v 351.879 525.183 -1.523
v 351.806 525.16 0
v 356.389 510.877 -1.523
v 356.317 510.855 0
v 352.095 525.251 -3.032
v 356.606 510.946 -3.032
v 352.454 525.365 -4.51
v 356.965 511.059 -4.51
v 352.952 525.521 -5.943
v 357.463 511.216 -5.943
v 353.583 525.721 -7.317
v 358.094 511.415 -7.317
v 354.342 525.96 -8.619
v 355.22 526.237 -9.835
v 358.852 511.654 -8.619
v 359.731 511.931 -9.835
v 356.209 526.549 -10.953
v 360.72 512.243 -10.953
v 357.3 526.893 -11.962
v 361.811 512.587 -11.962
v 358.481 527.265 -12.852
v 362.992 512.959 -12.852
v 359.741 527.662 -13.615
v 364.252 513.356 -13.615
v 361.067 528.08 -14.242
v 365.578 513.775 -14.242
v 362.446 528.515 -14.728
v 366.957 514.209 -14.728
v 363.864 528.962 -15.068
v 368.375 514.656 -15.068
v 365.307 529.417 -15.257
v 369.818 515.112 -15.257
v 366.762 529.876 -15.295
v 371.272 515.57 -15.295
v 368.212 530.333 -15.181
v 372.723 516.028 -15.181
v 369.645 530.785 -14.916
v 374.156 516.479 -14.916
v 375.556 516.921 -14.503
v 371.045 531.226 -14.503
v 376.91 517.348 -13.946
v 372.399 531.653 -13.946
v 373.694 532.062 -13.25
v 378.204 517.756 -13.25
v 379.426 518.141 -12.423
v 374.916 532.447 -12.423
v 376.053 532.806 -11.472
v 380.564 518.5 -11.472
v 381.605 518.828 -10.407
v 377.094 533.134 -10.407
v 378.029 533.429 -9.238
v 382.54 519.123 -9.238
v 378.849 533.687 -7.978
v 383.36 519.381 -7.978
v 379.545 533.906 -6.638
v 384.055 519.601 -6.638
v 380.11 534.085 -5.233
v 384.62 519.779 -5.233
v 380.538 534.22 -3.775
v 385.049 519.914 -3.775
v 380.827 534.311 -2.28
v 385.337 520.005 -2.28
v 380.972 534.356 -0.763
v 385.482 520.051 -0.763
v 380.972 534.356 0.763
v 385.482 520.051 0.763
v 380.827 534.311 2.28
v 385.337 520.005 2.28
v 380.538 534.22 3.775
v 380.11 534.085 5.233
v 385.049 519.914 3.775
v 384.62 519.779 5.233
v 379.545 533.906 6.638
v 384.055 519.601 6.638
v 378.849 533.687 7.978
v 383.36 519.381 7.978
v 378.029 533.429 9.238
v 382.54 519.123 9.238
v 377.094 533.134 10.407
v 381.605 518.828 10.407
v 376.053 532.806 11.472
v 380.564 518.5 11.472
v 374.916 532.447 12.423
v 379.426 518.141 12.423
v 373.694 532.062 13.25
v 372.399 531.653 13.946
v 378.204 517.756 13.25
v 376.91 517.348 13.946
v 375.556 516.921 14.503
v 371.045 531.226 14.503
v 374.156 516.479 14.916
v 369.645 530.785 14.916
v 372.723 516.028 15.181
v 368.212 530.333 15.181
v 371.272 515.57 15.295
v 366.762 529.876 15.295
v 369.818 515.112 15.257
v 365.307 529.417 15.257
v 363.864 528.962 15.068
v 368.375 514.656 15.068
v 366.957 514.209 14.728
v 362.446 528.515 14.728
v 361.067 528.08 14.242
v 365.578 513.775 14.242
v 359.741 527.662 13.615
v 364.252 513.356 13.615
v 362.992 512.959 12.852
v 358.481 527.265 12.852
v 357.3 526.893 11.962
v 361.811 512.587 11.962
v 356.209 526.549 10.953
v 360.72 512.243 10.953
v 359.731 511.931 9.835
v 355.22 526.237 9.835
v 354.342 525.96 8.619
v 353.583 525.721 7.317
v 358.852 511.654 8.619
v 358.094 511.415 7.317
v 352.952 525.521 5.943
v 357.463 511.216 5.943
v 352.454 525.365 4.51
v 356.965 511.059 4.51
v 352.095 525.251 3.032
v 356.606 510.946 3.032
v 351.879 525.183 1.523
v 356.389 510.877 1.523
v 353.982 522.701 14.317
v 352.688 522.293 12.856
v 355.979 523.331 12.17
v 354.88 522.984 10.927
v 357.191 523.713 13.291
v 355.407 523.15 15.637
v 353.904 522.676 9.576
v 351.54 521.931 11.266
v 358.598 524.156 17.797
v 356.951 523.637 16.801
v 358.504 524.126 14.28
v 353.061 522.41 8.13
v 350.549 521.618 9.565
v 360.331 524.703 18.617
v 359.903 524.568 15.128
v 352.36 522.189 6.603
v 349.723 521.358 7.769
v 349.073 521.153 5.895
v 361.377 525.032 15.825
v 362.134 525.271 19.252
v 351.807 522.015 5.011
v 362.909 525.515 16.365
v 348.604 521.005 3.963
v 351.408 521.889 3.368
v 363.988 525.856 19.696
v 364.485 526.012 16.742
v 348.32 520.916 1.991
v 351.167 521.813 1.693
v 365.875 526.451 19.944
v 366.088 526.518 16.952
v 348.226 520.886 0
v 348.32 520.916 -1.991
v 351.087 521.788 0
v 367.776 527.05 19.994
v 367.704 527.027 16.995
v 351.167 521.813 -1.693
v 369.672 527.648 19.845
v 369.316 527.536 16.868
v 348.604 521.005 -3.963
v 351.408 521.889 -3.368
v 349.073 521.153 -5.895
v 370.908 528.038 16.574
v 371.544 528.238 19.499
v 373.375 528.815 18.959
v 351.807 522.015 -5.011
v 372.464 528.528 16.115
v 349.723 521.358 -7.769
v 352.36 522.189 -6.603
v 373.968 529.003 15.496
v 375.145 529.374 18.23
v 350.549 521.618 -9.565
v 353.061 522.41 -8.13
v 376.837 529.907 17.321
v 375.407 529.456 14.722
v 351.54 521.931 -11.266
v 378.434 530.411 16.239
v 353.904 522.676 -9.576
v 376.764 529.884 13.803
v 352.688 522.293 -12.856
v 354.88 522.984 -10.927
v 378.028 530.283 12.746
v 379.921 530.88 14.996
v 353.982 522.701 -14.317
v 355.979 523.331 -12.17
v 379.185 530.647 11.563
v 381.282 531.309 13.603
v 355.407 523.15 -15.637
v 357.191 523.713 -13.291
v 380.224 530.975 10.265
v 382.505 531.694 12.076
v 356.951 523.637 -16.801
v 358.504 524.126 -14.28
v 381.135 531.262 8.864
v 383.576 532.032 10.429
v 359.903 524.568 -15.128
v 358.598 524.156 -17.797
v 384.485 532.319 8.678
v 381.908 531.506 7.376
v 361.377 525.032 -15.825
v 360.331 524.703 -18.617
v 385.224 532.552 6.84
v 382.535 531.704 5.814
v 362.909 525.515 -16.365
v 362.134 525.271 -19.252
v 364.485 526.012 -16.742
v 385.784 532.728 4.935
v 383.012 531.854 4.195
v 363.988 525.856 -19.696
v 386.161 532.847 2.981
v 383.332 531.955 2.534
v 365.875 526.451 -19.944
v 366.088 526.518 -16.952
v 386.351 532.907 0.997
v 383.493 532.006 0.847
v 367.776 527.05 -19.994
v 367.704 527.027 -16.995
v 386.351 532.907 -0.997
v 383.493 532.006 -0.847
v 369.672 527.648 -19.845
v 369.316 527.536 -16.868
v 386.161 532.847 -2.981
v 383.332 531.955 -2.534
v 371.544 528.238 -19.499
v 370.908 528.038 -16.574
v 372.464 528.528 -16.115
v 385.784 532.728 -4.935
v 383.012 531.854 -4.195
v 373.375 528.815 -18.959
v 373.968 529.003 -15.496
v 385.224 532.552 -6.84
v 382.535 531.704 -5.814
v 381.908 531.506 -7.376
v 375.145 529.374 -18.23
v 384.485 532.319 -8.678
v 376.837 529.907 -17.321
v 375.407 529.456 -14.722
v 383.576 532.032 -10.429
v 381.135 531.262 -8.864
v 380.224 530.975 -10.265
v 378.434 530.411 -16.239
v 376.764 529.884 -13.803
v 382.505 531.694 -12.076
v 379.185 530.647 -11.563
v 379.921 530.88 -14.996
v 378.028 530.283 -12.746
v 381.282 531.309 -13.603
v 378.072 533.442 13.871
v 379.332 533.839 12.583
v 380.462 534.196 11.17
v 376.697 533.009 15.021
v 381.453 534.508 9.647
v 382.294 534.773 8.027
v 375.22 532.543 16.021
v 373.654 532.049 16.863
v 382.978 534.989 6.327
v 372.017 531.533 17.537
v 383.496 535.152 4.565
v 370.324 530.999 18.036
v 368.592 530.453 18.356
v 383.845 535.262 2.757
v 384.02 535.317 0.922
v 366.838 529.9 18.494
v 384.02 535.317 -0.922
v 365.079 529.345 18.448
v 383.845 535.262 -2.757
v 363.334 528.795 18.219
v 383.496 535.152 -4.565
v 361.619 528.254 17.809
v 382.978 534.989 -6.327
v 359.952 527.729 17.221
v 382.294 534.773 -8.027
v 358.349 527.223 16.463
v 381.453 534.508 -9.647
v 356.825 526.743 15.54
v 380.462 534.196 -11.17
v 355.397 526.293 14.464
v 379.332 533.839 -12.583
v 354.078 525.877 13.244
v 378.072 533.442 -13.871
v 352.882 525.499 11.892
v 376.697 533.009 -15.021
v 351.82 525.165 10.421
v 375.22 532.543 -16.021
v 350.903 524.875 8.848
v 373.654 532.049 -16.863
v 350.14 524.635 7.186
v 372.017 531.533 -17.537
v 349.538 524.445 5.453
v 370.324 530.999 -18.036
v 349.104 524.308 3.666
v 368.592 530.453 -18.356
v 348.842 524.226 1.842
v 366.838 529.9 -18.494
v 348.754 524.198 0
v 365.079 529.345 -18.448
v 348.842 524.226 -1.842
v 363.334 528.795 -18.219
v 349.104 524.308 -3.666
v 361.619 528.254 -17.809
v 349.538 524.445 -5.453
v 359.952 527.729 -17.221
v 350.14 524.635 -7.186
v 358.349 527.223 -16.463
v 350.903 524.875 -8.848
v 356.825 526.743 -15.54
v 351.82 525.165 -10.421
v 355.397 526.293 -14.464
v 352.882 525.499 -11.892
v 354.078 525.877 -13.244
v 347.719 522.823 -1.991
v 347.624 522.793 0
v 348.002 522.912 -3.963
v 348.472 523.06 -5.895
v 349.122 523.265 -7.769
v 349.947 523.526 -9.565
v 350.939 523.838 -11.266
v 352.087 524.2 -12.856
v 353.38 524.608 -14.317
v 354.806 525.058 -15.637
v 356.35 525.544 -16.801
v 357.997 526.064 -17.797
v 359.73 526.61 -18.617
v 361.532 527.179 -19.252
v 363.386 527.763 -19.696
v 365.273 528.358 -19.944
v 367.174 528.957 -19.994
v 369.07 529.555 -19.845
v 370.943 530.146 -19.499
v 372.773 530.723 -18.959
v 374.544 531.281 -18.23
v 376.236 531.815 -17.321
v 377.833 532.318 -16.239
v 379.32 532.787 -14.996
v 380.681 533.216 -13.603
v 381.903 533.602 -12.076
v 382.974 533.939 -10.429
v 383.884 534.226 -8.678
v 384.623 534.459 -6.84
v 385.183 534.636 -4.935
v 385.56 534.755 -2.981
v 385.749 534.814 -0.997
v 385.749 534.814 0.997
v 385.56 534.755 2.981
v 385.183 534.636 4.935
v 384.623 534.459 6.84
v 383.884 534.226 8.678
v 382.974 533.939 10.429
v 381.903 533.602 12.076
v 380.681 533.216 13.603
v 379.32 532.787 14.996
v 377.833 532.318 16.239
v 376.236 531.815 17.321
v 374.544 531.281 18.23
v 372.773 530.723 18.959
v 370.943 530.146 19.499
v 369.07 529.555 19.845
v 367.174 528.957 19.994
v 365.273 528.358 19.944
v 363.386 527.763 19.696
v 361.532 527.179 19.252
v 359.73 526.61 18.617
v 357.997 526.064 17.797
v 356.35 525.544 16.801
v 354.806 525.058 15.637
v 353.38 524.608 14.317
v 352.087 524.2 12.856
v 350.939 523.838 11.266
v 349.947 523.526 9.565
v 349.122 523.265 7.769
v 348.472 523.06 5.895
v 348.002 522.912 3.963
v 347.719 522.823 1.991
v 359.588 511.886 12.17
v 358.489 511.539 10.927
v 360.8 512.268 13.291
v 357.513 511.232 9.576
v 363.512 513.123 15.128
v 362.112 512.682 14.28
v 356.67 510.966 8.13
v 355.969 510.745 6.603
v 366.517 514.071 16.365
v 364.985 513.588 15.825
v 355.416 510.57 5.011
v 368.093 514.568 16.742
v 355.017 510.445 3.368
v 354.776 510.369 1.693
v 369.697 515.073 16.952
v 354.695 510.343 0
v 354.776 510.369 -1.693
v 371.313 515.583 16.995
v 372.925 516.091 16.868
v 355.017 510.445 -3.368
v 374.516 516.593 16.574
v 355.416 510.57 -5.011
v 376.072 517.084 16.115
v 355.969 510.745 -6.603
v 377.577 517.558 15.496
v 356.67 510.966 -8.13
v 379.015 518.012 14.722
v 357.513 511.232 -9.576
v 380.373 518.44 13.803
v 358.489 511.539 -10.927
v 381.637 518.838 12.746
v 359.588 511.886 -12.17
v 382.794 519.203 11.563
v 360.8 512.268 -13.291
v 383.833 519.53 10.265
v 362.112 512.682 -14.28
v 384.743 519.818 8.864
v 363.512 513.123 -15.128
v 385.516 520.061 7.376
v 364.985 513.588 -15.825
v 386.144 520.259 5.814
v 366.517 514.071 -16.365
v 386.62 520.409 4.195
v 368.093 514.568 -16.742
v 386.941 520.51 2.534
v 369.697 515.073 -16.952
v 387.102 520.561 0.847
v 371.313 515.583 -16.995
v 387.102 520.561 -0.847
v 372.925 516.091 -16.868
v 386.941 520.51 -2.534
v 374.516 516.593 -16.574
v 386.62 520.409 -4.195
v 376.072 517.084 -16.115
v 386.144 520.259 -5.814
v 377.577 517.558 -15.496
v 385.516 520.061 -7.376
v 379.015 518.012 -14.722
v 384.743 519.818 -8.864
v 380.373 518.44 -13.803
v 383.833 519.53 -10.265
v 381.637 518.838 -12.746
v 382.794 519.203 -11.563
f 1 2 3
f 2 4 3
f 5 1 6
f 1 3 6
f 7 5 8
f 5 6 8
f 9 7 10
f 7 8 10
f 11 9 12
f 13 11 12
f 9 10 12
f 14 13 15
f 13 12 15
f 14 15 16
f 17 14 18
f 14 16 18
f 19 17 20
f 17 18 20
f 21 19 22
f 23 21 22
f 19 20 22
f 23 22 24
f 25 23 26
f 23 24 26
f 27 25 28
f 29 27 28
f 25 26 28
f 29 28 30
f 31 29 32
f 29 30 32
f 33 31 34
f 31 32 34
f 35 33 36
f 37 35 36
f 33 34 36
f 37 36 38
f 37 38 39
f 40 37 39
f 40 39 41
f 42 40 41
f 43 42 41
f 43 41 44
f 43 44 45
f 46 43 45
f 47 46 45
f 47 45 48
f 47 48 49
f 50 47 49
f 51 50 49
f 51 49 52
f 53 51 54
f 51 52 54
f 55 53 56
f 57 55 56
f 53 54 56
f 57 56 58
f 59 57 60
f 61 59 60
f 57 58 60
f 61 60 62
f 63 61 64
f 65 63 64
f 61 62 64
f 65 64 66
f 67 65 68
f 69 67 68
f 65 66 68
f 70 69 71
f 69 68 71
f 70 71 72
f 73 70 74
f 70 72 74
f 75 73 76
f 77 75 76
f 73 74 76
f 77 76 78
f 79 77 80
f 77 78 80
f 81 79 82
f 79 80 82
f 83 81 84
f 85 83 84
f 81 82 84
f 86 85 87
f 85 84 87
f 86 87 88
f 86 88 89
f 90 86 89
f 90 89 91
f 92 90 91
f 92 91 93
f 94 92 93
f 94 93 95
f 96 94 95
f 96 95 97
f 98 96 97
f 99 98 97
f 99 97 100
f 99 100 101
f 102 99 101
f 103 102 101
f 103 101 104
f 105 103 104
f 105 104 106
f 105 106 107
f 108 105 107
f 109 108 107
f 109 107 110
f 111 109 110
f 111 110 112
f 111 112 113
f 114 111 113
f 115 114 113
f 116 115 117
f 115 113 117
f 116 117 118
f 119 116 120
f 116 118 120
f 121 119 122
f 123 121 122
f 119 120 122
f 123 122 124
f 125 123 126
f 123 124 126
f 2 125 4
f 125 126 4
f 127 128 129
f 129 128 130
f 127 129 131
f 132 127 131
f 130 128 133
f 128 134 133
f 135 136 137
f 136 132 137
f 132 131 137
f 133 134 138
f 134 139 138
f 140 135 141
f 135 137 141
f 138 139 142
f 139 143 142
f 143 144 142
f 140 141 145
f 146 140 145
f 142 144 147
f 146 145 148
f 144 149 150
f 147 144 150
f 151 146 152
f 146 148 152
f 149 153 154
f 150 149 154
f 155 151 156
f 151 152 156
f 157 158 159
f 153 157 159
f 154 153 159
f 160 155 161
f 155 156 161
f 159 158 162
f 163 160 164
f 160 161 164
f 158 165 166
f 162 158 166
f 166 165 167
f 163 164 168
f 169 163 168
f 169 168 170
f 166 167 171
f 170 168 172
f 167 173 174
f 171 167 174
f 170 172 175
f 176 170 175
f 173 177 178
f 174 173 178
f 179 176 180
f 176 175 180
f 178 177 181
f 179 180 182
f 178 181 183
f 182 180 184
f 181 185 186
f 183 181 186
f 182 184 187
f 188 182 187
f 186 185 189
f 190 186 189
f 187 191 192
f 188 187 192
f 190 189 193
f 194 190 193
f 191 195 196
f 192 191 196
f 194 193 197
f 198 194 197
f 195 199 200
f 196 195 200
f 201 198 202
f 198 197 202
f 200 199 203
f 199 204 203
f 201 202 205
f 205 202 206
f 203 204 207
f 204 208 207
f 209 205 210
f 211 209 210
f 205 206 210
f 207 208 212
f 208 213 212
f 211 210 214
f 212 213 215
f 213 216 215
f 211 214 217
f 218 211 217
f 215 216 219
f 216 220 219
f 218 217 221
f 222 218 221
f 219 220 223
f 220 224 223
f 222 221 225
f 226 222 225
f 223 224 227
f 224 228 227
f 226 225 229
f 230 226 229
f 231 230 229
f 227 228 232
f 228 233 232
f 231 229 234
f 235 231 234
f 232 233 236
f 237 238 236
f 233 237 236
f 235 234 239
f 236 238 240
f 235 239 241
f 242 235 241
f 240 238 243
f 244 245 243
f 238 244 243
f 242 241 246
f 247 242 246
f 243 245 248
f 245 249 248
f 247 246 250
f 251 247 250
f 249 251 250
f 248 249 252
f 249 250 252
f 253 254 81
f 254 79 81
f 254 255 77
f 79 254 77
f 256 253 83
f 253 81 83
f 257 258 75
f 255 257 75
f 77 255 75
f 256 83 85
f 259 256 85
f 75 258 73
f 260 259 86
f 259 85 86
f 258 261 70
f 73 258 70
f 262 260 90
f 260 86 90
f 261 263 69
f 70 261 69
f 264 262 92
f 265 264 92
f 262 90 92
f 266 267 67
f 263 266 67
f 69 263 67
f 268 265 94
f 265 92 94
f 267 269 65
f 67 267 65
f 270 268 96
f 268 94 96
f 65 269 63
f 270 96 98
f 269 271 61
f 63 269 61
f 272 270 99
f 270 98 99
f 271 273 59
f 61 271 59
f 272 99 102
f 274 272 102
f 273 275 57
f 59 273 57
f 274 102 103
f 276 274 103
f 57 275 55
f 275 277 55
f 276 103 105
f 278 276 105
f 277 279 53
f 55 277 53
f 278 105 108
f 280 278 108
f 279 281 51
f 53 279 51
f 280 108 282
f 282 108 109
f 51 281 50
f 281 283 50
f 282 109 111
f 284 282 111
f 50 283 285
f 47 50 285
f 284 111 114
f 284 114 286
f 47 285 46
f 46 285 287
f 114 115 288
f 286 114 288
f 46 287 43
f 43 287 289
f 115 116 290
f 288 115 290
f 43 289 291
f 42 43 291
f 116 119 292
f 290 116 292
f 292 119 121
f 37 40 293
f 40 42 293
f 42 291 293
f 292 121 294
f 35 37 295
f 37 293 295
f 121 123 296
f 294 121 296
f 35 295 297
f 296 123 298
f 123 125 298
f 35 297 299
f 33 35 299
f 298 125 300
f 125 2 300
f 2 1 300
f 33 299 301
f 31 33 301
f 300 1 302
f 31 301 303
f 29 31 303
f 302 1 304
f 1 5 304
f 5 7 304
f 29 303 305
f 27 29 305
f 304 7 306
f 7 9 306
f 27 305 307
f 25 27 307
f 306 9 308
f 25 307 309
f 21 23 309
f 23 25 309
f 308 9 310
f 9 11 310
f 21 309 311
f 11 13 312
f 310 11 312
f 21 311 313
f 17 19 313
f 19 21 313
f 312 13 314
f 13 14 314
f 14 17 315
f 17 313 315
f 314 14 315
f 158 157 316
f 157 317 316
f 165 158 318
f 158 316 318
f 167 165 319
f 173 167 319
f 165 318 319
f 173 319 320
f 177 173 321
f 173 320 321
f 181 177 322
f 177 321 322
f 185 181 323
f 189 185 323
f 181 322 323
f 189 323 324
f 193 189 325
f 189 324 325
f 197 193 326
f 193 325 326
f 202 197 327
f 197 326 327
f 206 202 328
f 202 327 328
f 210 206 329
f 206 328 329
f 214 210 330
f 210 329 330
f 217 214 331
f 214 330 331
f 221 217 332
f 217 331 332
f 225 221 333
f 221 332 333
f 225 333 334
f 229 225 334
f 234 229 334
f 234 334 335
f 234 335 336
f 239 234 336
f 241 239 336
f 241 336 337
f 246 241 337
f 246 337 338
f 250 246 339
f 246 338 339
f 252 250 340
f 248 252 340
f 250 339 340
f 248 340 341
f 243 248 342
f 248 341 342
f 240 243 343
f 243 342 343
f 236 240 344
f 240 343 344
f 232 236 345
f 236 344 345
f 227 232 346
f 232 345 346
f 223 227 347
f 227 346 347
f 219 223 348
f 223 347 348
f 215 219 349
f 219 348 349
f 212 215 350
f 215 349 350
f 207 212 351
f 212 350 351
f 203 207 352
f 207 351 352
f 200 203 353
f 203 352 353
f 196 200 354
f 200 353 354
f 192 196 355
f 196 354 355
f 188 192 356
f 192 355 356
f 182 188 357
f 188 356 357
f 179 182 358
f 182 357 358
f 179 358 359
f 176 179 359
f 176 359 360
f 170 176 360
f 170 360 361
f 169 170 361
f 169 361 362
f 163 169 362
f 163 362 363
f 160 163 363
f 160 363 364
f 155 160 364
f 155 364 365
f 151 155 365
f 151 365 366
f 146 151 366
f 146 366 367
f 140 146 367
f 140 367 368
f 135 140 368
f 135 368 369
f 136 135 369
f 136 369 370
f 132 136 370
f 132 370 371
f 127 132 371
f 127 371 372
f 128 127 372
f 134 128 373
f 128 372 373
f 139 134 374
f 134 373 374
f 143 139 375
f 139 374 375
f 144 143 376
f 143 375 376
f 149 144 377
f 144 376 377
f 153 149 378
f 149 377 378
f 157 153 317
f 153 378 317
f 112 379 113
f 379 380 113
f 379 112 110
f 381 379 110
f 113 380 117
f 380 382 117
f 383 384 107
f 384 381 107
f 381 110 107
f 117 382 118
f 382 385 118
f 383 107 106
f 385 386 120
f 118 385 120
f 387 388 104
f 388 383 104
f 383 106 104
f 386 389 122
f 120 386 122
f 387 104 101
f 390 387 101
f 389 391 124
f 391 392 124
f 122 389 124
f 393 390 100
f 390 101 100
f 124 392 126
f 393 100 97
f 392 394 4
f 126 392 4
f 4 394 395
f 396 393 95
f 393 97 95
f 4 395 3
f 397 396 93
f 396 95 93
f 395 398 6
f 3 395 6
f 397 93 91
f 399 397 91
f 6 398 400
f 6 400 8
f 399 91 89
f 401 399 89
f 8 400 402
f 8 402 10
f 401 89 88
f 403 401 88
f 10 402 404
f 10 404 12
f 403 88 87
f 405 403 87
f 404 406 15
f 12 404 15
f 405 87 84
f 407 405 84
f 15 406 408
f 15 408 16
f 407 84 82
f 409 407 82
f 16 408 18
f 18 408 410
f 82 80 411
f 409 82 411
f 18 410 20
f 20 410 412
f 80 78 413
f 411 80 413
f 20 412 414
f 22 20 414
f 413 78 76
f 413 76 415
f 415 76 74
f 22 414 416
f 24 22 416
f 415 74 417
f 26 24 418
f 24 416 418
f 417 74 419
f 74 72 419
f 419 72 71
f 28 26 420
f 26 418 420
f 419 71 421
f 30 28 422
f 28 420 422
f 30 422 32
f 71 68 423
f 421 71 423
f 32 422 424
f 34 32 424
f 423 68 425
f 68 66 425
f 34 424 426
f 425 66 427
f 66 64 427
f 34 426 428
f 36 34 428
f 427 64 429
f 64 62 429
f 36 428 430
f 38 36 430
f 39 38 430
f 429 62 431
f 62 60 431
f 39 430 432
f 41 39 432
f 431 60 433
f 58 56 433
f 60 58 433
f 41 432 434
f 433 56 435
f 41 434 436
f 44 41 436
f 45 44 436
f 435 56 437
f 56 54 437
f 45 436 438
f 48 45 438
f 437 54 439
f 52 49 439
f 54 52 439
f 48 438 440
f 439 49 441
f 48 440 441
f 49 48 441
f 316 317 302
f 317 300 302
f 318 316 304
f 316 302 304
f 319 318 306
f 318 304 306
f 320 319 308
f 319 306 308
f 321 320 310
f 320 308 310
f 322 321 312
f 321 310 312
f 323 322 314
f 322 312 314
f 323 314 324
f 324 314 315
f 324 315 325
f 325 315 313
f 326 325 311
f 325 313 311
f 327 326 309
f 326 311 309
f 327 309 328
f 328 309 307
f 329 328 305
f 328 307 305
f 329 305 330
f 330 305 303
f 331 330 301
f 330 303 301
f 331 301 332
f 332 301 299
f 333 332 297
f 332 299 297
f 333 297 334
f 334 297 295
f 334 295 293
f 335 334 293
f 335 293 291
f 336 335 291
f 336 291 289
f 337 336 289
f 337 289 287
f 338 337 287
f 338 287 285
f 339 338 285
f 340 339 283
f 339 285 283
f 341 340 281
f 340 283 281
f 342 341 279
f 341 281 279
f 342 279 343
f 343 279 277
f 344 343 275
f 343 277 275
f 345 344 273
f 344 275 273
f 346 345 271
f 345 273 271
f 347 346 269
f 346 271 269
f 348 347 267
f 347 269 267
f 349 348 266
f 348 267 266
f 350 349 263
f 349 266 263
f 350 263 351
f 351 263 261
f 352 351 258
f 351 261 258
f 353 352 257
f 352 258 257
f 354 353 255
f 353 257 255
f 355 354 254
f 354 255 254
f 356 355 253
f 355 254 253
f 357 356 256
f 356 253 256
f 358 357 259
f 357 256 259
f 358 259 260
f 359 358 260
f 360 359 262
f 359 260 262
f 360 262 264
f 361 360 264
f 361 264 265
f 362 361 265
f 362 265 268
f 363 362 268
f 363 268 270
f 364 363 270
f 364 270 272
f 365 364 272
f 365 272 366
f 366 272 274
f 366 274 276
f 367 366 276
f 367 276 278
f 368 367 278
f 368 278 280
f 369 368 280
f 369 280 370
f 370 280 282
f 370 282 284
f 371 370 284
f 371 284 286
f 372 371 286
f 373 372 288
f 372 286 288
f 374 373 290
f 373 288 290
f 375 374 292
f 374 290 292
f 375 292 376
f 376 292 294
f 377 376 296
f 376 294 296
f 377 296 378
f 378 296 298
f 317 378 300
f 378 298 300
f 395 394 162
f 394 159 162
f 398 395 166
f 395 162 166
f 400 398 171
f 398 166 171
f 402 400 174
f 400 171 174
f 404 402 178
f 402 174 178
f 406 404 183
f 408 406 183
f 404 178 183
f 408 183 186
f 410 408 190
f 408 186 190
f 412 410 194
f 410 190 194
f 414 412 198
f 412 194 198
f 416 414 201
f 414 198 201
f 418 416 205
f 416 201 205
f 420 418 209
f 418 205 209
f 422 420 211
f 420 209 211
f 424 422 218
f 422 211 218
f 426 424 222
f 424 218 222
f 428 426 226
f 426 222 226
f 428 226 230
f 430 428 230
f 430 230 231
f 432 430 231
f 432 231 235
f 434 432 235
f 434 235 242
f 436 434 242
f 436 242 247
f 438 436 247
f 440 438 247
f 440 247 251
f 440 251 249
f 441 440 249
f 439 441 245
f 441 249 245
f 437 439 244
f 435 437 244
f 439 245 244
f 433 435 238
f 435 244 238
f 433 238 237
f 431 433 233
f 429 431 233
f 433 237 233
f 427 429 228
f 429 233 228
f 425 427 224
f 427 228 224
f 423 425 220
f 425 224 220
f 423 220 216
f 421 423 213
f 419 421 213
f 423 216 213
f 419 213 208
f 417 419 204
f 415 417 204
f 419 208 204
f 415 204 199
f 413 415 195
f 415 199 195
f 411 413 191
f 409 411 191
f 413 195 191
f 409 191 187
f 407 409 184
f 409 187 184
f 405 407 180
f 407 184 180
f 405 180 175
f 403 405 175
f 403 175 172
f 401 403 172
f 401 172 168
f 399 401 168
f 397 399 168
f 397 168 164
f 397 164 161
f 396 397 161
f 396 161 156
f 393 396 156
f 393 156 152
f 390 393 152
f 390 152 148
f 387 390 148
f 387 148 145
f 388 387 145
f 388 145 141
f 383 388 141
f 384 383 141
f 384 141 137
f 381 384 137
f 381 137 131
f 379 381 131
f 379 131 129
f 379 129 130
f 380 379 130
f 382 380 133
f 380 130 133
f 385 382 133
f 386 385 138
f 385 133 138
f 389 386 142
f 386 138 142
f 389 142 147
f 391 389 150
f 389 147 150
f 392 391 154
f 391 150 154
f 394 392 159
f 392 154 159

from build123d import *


with BuildPart() as part:
    # Sk_Cono → Cono (revolve)
    with BuildSketch(Plane.XY, mode=Mode.PRIVATE) as cono_sk:
        Polygon((385.500399814, 520.056357213), (387.121714083, 520.567571493), (383.513142692, 532.012142805), (386.37428552, 532.914285653), (385.772856954, 534.821714205), (384.041571258, 535.324357057), (380.989685575, 534.362071352), align=None)
    revolve(cono_sk.sketch.rotate(Axis((364.894285739, 534.529714208, 0), (0.3007142826457708, -0.9537142759825081, 0)), 180), axis=Axis((364.894285739, 534.529714208, 0), (0.3007142826457708, -0.9537142759825081, 0)))


solid = part.part
